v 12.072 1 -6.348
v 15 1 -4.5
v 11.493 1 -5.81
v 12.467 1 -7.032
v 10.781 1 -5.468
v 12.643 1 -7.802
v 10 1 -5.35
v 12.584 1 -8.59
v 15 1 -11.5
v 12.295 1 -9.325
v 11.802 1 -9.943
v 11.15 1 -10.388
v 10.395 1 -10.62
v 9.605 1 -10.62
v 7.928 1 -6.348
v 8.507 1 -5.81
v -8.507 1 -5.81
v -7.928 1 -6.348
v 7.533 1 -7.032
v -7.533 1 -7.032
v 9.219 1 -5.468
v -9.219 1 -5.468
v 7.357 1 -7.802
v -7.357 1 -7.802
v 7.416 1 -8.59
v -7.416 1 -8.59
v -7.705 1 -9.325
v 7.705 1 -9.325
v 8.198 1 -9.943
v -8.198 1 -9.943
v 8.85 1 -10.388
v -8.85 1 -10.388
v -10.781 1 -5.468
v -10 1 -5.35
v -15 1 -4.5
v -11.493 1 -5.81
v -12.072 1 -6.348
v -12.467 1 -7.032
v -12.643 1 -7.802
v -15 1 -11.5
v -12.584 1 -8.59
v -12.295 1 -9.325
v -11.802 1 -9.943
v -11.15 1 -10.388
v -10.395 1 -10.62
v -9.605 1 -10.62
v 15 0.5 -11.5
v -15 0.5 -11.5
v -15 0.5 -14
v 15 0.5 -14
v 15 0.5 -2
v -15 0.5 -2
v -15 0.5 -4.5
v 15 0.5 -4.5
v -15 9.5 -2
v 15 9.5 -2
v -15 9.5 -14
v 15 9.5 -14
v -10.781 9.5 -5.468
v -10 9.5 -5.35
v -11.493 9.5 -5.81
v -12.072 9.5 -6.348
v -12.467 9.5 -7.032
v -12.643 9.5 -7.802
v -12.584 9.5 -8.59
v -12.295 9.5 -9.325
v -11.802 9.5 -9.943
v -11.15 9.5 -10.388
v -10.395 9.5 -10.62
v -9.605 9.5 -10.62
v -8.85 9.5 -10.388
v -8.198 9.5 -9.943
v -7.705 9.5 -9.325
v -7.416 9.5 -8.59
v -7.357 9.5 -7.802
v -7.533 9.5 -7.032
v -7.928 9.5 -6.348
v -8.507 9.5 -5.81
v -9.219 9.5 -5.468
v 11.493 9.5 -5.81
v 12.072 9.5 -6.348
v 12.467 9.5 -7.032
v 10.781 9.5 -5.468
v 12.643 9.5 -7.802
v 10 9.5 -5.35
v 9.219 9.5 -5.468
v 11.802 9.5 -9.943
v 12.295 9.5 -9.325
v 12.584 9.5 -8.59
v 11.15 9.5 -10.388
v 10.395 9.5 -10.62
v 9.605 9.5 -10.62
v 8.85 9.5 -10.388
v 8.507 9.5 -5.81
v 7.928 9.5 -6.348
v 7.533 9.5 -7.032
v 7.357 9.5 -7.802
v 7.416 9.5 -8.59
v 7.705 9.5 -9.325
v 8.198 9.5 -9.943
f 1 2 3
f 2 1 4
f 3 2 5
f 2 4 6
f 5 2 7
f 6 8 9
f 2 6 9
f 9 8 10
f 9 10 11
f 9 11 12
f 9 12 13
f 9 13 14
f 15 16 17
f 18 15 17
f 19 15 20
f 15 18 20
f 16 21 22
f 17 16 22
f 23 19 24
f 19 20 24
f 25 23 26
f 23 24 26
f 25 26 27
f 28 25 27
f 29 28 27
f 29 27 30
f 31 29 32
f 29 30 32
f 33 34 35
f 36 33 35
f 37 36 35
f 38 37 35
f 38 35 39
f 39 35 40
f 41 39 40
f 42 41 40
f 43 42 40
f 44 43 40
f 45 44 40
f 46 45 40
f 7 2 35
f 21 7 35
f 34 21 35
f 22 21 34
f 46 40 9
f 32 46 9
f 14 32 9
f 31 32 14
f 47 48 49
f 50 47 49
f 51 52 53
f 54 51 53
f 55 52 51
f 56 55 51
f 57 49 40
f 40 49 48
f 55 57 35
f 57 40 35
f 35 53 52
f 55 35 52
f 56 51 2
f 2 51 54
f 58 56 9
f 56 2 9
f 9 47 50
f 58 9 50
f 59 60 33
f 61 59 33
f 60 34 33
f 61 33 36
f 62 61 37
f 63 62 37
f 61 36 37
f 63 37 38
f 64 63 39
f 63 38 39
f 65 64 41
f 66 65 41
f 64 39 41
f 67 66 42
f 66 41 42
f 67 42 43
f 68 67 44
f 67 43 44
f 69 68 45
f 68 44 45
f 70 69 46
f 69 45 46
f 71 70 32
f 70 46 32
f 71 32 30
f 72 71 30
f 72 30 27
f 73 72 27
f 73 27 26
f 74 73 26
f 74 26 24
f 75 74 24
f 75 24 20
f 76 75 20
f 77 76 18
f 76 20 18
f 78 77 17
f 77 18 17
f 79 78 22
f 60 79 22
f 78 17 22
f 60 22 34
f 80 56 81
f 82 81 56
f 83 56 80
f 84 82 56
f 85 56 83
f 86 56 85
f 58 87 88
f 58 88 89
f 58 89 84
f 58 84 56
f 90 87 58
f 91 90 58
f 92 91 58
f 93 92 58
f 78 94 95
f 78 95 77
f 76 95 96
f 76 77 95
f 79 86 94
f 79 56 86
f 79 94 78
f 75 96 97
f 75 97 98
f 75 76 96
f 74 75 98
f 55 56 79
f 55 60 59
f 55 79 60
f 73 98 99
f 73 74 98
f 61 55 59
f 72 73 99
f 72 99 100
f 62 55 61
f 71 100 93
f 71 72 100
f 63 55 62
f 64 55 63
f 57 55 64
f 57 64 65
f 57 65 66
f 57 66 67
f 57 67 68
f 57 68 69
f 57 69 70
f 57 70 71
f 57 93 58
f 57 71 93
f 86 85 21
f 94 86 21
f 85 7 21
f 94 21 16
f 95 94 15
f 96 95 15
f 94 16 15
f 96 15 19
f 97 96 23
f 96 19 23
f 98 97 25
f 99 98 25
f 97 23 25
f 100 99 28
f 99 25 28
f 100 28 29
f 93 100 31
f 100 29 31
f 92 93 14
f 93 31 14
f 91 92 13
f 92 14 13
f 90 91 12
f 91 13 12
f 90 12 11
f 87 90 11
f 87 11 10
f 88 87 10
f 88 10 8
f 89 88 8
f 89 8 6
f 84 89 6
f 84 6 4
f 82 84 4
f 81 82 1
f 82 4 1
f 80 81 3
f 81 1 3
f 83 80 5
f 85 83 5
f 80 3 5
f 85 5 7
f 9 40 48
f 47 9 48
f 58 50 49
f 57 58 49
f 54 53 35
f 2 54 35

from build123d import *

# Parameters (mm, degrees)
BOSS_EXTRUDE3_DEPTH           = 20.5
BOSS_EXTRUDE3_DEPTH_BACK      = 20.5
CUT_EXTRUDE1_DEPTH            = 30.004310025
CUT_EXTRUDE1_DEPTH_BACK       = 30.004310025
SKETCH5_W                     = 12
SKETCH5_H                     = 11
SPLIT1_SURFACE_1_BACK         = 57.187
SPLIT1_SURFACE_1_DEPTH        = 114.374
SPLIT1_SURFACE_2_BACK         = 57.187
SPLIT1_SURFACE_2_DEPTH        = 114.374
M5_TAPPED_HOLE1_AT_2_COUNT    = 2
M5_TAPPED_HOLE1_AT_2_PITCH    = 20
SKETCH13_W                    = 2.65
SKETCH13_H                    = 8.5
M5_CLEARANCE_HOLE1_AT_2_COUNT = 2
M5_CLEARANCE_HOLE1_AT_2_PITCH = 20
SKETCH4_W                     = 1.65
SKETCH4_H                     = 25.5
SKETCH4_AT_POINT_2_W          = 1.65
SKETCH4_AT_POINT_2_H          = 25.5
SKETCH4_AT_POINT_3_W          = 1.65
SKETCH4_AT_POINT_3_H          = 25.5
SKETCH4_AT_POINT_4_W          = 1.65
SKETCH4_AT_POINT_4_H          = 25.5
CHAMFER1_SIZE                 = 2
CHAMFER2_SIZE                 = 1
CHAMFER2_SIZE2                = 1.732050808
FILLET1_R                     = 0.2


with BuildPart() as part:
    # Sketch3 → Boss-Extrude3 (new, two sides: drawn at the far end of the back side and taken through both)
    with BuildSketch(Plane(origin=(0, 0, 0), x_dir=(1, 0, 0), z_dir=(0, 1, 0)).offset(-BOSS_EXTRUDE3_DEPTH_BACK)):
        Polygon((10.5, -10), (10.5, 0), (12.5, 0), (12.5, 2), (15, 2), (15, 14), (-15, 14), (-15, 2), (-10.5, 2), (-10.5, 0), (-10.5, -10), align=None)
    extrude(amount=BOSS_EXTRUDE3_DEPTH + BOSS_EXTRUDE3_DEPTH_BACK)

    # Sketch5 → Cut-Extrude1 (cut, two sides: drawn at the far end of the back side and taken through both)
    with BuildSketch(Plane(origin=(0, 0, 0), x_dir=(0, 0, -1), z_dir=(1, 0, 0)).offset(-CUT_EXTRUDE1_DEPTH_BACK)):
        Polygon((2, 0.5), (4.5, 0.5), (4.5, 1), (11.5, 1), (11.5, 0.5), (14, 0.5), (14, -0.5), (11.5, -0.5), (11.5, -1), (4.5, -1), (4.5, -0.5), (2, -0.5), align=None)
        with Locations((8, 15)):
            Rectangle(SKETCH5_W, SKETCH5_H)
    extrude(amount=CUT_EXTRUDE1_DEPTH + CUT_EXTRUDE1_DEPTH_BACK, mode=Mode.SUBTRACT)


with BuildPart() as body_2:
    # Split1: the piece behind the surface
    add(part.part)
    # Split1 surface: a surface, the sketch's curves swept straight by 114.374 mm
    with BuildLine(Plane.ZY.offset(10.5).offset(-SPLIT1_SURFACE_1_BACK), mode=Mode.PRIVATE) as split1_surface_1_path:
        Line((-2, 20.5), (-2, -0.5))
    split1_surface_1 = Shell.extrude(split1_surface_1_path.wire(), (-1 * SPLIT1_SURFACE_1_DEPTH, 0 * SPLIT1_SURFACE_1_DEPTH, 0 * SPLIT1_SURFACE_1_DEPTH))
    split(bisect_by=split1_surface_1, keep=Keep.BOTTOM)

    # Sketch13 → M5 Clearance Hole1 (revolve, cut)
    with BuildSketch(Plane(origin=(-10, 9.5, -8), x_dir=(0, 0, 1), z_dir=(1, 0, 0))):
        with Locations((1.325, 4.25)):
            Rectangle(SKETCH13_W, SKETCH13_H)
    m5_clearance_hole1 = revolve(axis=Axis((-10, 15.85, -8), (0, -1, 0)), mode=Mode.SUBTRACT)

    # M5 Clearance Hole1 at 2: M5 Clearance Hole1 ×2
    with Locations(*[(i * M5_CLEARANCE_HOLE1_AT_2_PITCH, 0, 0) for i in range(1, M5_CLEARANCE_HOLE1_AT_2_COUNT)]):
        add(m5_clearance_hole1, mode=Mode.SUBTRACT)


with BuildPart() as part_1:
    add(part.part)

    # Split1: split by a surface, the side it looks to stays
    # Split1 surface: a surface, the sketch's curves swept straight by 114.374 mm
    with BuildLine(Plane.ZY.offset(10.5).offset(-SPLIT1_SURFACE_2_BACK), mode=Mode.PRIVATE) as split1_surface_2_path:
        Line((-2, 20.5), (-2, -0.5))
    split1_surface_2 = Shell.extrude(split1_surface_2_path.wire(), (-1 * SPLIT1_SURFACE_2_DEPTH, 0 * SPLIT1_SURFACE_2_DEPTH, 0 * SPLIT1_SURFACE_2_DEPTH))
    split(bisect_by=split1_surface_2, keep=Keep.TOP)

    # Sketch10 → M5 Tapped Hole1 (revolve, cut)
    with BuildSketch(Plane(origin=(-10, -1, -8), x_dir=(0, 0, 1), z_dir=(1, 0, 0))):
        Polygon((0, 0), (0, 15.2618073), (2.1, 14), (2.1, 0), align=None)
    m5_tapped_hole1 = revolve(axis=Axis((-10, 5.35, -8), (0, -1, 0)), mode=Mode.SUBTRACT)

    # M5 Tapped Hole1 at 2: M5 Tapped Hole1 ×2
    with Locations(*[(i * M5_TAPPED_HOLE1_AT_2_PITCH, 0, 0) for i in range(1, M5_TAPPED_HOLE1_AT_2_COUNT)]):
        add(m5_tapped_hole1, mode=Mode.SUBTRACT)

    # Sketch4 → M4 Tapped Hole1 (revolve, cut)
    with BuildSketch(Plane(origin=(10.5, 12.5, 5), x_dir=(0, 0, -1), z_dir=(0, 1, 0))):
        with Locations((0.825, 12.75)):
            Rectangle(SKETCH4_W, SKETCH4_H)
    revolve(axis=Axis((10.5, 12.5, 3.35), (0, 0, 1)), mode=Mode.SUBTRACT)

    # Sketch4 at point 2 (carried to point 2, square into its face) → M4 Tapped Hole1 at 2 (revolve, cut)
    with BuildSketch(Plane(origin=(10.5, -12.5, 5), x_dir=(1, 0, 0), z_dir=(0, 1, 0))):
        with Locations((0.825, 12.75)):
            Rectangle(SKETCH4_AT_POINT_2_W, SKETCH4_AT_POINT_2_H)
    revolve(axis=Axis((12.15, -12.5, 5), (-1, 0, 0)), mode=Mode.SUBTRACT)

    # Sketch4 at point 3 (carried to point 3, square into its face) → M4 Tapped Hole1 at 3 (revolve, cut)
    with BuildSketch(Plane(origin=(-10.5, 12.5, 5), x_dir=(-1, 0, 0), z_dir=(0, 1, 0))):
        with Locations((0.825, 12.75)):
            Rectangle(SKETCH4_AT_POINT_3_W, SKETCH4_AT_POINT_3_H)
    revolve(axis=Axis((-12.15, 12.5, 5), (1, 0, 0)), mode=Mode.SUBTRACT)

    # Sketch4 at point 4 (carried to point 4, square into its face) → M4 Tapped Hole1 at 4 (revolve, cut)
    with BuildSketch(Plane(origin=(-10.5, -12.5, 5), x_dir=(-1, 0, 0), z_dir=(0, 1, 0))):
        with Locations((0.825, 12.75)):
            Rectangle(SKETCH4_AT_POINT_4_W, SKETCH4_AT_POINT_4_H)
    revolve(axis=Axis((-12.15, -12.5, 5), (1, 0, 0)), mode=Mode.SUBTRACT)

    # Chamfer1
    chamfer1_edges = [part_1.edges().sort_by_distance(p)[0] for p in [
        (-10.5, -20.5, -2),
        (10.5, -20.5, -2),
        (10.5, 20.5, 7.5),
        (-10.5, 20.5, 0.675),
    ]]
    chamfer(chamfer1_edges, length=CHAMFER1_SIZE)

    # Chamfer2
    chamfer2_edges = [part_1.edges().sort_by_distance(p)[0] for p in [
        (0, -20.5, 10),
        (10.5, 0, 10),
        (-1, 20.5, 10),
        (-10.5, 1, 10),
        (-1, 20.5, 10),
        (9.5, 19.5, 10),
        (-9.5, -19.5, 10),
        (9.5, -19.5, 10),
    ]]
    chamfer2_side = [part_1.faces().sort_by_distance(p)[0] for p in [
        (-0.023001949, 0.046393762, 10),
    ]]
    chamfer(chamfer2_edges, length=CHAMFER2_SIZE, length2=CHAMFER2_SIZE2, reference=chamfer2_side[0])

    # Fillet1
    fillet1_edges = [part_1.edges().sort_by_distance(p)[0] for p in [
        (0, -0.5, -2),
    ]]
    fillet(fillet1_edges, radius=FILLET1_R)


solid = body_2.part
